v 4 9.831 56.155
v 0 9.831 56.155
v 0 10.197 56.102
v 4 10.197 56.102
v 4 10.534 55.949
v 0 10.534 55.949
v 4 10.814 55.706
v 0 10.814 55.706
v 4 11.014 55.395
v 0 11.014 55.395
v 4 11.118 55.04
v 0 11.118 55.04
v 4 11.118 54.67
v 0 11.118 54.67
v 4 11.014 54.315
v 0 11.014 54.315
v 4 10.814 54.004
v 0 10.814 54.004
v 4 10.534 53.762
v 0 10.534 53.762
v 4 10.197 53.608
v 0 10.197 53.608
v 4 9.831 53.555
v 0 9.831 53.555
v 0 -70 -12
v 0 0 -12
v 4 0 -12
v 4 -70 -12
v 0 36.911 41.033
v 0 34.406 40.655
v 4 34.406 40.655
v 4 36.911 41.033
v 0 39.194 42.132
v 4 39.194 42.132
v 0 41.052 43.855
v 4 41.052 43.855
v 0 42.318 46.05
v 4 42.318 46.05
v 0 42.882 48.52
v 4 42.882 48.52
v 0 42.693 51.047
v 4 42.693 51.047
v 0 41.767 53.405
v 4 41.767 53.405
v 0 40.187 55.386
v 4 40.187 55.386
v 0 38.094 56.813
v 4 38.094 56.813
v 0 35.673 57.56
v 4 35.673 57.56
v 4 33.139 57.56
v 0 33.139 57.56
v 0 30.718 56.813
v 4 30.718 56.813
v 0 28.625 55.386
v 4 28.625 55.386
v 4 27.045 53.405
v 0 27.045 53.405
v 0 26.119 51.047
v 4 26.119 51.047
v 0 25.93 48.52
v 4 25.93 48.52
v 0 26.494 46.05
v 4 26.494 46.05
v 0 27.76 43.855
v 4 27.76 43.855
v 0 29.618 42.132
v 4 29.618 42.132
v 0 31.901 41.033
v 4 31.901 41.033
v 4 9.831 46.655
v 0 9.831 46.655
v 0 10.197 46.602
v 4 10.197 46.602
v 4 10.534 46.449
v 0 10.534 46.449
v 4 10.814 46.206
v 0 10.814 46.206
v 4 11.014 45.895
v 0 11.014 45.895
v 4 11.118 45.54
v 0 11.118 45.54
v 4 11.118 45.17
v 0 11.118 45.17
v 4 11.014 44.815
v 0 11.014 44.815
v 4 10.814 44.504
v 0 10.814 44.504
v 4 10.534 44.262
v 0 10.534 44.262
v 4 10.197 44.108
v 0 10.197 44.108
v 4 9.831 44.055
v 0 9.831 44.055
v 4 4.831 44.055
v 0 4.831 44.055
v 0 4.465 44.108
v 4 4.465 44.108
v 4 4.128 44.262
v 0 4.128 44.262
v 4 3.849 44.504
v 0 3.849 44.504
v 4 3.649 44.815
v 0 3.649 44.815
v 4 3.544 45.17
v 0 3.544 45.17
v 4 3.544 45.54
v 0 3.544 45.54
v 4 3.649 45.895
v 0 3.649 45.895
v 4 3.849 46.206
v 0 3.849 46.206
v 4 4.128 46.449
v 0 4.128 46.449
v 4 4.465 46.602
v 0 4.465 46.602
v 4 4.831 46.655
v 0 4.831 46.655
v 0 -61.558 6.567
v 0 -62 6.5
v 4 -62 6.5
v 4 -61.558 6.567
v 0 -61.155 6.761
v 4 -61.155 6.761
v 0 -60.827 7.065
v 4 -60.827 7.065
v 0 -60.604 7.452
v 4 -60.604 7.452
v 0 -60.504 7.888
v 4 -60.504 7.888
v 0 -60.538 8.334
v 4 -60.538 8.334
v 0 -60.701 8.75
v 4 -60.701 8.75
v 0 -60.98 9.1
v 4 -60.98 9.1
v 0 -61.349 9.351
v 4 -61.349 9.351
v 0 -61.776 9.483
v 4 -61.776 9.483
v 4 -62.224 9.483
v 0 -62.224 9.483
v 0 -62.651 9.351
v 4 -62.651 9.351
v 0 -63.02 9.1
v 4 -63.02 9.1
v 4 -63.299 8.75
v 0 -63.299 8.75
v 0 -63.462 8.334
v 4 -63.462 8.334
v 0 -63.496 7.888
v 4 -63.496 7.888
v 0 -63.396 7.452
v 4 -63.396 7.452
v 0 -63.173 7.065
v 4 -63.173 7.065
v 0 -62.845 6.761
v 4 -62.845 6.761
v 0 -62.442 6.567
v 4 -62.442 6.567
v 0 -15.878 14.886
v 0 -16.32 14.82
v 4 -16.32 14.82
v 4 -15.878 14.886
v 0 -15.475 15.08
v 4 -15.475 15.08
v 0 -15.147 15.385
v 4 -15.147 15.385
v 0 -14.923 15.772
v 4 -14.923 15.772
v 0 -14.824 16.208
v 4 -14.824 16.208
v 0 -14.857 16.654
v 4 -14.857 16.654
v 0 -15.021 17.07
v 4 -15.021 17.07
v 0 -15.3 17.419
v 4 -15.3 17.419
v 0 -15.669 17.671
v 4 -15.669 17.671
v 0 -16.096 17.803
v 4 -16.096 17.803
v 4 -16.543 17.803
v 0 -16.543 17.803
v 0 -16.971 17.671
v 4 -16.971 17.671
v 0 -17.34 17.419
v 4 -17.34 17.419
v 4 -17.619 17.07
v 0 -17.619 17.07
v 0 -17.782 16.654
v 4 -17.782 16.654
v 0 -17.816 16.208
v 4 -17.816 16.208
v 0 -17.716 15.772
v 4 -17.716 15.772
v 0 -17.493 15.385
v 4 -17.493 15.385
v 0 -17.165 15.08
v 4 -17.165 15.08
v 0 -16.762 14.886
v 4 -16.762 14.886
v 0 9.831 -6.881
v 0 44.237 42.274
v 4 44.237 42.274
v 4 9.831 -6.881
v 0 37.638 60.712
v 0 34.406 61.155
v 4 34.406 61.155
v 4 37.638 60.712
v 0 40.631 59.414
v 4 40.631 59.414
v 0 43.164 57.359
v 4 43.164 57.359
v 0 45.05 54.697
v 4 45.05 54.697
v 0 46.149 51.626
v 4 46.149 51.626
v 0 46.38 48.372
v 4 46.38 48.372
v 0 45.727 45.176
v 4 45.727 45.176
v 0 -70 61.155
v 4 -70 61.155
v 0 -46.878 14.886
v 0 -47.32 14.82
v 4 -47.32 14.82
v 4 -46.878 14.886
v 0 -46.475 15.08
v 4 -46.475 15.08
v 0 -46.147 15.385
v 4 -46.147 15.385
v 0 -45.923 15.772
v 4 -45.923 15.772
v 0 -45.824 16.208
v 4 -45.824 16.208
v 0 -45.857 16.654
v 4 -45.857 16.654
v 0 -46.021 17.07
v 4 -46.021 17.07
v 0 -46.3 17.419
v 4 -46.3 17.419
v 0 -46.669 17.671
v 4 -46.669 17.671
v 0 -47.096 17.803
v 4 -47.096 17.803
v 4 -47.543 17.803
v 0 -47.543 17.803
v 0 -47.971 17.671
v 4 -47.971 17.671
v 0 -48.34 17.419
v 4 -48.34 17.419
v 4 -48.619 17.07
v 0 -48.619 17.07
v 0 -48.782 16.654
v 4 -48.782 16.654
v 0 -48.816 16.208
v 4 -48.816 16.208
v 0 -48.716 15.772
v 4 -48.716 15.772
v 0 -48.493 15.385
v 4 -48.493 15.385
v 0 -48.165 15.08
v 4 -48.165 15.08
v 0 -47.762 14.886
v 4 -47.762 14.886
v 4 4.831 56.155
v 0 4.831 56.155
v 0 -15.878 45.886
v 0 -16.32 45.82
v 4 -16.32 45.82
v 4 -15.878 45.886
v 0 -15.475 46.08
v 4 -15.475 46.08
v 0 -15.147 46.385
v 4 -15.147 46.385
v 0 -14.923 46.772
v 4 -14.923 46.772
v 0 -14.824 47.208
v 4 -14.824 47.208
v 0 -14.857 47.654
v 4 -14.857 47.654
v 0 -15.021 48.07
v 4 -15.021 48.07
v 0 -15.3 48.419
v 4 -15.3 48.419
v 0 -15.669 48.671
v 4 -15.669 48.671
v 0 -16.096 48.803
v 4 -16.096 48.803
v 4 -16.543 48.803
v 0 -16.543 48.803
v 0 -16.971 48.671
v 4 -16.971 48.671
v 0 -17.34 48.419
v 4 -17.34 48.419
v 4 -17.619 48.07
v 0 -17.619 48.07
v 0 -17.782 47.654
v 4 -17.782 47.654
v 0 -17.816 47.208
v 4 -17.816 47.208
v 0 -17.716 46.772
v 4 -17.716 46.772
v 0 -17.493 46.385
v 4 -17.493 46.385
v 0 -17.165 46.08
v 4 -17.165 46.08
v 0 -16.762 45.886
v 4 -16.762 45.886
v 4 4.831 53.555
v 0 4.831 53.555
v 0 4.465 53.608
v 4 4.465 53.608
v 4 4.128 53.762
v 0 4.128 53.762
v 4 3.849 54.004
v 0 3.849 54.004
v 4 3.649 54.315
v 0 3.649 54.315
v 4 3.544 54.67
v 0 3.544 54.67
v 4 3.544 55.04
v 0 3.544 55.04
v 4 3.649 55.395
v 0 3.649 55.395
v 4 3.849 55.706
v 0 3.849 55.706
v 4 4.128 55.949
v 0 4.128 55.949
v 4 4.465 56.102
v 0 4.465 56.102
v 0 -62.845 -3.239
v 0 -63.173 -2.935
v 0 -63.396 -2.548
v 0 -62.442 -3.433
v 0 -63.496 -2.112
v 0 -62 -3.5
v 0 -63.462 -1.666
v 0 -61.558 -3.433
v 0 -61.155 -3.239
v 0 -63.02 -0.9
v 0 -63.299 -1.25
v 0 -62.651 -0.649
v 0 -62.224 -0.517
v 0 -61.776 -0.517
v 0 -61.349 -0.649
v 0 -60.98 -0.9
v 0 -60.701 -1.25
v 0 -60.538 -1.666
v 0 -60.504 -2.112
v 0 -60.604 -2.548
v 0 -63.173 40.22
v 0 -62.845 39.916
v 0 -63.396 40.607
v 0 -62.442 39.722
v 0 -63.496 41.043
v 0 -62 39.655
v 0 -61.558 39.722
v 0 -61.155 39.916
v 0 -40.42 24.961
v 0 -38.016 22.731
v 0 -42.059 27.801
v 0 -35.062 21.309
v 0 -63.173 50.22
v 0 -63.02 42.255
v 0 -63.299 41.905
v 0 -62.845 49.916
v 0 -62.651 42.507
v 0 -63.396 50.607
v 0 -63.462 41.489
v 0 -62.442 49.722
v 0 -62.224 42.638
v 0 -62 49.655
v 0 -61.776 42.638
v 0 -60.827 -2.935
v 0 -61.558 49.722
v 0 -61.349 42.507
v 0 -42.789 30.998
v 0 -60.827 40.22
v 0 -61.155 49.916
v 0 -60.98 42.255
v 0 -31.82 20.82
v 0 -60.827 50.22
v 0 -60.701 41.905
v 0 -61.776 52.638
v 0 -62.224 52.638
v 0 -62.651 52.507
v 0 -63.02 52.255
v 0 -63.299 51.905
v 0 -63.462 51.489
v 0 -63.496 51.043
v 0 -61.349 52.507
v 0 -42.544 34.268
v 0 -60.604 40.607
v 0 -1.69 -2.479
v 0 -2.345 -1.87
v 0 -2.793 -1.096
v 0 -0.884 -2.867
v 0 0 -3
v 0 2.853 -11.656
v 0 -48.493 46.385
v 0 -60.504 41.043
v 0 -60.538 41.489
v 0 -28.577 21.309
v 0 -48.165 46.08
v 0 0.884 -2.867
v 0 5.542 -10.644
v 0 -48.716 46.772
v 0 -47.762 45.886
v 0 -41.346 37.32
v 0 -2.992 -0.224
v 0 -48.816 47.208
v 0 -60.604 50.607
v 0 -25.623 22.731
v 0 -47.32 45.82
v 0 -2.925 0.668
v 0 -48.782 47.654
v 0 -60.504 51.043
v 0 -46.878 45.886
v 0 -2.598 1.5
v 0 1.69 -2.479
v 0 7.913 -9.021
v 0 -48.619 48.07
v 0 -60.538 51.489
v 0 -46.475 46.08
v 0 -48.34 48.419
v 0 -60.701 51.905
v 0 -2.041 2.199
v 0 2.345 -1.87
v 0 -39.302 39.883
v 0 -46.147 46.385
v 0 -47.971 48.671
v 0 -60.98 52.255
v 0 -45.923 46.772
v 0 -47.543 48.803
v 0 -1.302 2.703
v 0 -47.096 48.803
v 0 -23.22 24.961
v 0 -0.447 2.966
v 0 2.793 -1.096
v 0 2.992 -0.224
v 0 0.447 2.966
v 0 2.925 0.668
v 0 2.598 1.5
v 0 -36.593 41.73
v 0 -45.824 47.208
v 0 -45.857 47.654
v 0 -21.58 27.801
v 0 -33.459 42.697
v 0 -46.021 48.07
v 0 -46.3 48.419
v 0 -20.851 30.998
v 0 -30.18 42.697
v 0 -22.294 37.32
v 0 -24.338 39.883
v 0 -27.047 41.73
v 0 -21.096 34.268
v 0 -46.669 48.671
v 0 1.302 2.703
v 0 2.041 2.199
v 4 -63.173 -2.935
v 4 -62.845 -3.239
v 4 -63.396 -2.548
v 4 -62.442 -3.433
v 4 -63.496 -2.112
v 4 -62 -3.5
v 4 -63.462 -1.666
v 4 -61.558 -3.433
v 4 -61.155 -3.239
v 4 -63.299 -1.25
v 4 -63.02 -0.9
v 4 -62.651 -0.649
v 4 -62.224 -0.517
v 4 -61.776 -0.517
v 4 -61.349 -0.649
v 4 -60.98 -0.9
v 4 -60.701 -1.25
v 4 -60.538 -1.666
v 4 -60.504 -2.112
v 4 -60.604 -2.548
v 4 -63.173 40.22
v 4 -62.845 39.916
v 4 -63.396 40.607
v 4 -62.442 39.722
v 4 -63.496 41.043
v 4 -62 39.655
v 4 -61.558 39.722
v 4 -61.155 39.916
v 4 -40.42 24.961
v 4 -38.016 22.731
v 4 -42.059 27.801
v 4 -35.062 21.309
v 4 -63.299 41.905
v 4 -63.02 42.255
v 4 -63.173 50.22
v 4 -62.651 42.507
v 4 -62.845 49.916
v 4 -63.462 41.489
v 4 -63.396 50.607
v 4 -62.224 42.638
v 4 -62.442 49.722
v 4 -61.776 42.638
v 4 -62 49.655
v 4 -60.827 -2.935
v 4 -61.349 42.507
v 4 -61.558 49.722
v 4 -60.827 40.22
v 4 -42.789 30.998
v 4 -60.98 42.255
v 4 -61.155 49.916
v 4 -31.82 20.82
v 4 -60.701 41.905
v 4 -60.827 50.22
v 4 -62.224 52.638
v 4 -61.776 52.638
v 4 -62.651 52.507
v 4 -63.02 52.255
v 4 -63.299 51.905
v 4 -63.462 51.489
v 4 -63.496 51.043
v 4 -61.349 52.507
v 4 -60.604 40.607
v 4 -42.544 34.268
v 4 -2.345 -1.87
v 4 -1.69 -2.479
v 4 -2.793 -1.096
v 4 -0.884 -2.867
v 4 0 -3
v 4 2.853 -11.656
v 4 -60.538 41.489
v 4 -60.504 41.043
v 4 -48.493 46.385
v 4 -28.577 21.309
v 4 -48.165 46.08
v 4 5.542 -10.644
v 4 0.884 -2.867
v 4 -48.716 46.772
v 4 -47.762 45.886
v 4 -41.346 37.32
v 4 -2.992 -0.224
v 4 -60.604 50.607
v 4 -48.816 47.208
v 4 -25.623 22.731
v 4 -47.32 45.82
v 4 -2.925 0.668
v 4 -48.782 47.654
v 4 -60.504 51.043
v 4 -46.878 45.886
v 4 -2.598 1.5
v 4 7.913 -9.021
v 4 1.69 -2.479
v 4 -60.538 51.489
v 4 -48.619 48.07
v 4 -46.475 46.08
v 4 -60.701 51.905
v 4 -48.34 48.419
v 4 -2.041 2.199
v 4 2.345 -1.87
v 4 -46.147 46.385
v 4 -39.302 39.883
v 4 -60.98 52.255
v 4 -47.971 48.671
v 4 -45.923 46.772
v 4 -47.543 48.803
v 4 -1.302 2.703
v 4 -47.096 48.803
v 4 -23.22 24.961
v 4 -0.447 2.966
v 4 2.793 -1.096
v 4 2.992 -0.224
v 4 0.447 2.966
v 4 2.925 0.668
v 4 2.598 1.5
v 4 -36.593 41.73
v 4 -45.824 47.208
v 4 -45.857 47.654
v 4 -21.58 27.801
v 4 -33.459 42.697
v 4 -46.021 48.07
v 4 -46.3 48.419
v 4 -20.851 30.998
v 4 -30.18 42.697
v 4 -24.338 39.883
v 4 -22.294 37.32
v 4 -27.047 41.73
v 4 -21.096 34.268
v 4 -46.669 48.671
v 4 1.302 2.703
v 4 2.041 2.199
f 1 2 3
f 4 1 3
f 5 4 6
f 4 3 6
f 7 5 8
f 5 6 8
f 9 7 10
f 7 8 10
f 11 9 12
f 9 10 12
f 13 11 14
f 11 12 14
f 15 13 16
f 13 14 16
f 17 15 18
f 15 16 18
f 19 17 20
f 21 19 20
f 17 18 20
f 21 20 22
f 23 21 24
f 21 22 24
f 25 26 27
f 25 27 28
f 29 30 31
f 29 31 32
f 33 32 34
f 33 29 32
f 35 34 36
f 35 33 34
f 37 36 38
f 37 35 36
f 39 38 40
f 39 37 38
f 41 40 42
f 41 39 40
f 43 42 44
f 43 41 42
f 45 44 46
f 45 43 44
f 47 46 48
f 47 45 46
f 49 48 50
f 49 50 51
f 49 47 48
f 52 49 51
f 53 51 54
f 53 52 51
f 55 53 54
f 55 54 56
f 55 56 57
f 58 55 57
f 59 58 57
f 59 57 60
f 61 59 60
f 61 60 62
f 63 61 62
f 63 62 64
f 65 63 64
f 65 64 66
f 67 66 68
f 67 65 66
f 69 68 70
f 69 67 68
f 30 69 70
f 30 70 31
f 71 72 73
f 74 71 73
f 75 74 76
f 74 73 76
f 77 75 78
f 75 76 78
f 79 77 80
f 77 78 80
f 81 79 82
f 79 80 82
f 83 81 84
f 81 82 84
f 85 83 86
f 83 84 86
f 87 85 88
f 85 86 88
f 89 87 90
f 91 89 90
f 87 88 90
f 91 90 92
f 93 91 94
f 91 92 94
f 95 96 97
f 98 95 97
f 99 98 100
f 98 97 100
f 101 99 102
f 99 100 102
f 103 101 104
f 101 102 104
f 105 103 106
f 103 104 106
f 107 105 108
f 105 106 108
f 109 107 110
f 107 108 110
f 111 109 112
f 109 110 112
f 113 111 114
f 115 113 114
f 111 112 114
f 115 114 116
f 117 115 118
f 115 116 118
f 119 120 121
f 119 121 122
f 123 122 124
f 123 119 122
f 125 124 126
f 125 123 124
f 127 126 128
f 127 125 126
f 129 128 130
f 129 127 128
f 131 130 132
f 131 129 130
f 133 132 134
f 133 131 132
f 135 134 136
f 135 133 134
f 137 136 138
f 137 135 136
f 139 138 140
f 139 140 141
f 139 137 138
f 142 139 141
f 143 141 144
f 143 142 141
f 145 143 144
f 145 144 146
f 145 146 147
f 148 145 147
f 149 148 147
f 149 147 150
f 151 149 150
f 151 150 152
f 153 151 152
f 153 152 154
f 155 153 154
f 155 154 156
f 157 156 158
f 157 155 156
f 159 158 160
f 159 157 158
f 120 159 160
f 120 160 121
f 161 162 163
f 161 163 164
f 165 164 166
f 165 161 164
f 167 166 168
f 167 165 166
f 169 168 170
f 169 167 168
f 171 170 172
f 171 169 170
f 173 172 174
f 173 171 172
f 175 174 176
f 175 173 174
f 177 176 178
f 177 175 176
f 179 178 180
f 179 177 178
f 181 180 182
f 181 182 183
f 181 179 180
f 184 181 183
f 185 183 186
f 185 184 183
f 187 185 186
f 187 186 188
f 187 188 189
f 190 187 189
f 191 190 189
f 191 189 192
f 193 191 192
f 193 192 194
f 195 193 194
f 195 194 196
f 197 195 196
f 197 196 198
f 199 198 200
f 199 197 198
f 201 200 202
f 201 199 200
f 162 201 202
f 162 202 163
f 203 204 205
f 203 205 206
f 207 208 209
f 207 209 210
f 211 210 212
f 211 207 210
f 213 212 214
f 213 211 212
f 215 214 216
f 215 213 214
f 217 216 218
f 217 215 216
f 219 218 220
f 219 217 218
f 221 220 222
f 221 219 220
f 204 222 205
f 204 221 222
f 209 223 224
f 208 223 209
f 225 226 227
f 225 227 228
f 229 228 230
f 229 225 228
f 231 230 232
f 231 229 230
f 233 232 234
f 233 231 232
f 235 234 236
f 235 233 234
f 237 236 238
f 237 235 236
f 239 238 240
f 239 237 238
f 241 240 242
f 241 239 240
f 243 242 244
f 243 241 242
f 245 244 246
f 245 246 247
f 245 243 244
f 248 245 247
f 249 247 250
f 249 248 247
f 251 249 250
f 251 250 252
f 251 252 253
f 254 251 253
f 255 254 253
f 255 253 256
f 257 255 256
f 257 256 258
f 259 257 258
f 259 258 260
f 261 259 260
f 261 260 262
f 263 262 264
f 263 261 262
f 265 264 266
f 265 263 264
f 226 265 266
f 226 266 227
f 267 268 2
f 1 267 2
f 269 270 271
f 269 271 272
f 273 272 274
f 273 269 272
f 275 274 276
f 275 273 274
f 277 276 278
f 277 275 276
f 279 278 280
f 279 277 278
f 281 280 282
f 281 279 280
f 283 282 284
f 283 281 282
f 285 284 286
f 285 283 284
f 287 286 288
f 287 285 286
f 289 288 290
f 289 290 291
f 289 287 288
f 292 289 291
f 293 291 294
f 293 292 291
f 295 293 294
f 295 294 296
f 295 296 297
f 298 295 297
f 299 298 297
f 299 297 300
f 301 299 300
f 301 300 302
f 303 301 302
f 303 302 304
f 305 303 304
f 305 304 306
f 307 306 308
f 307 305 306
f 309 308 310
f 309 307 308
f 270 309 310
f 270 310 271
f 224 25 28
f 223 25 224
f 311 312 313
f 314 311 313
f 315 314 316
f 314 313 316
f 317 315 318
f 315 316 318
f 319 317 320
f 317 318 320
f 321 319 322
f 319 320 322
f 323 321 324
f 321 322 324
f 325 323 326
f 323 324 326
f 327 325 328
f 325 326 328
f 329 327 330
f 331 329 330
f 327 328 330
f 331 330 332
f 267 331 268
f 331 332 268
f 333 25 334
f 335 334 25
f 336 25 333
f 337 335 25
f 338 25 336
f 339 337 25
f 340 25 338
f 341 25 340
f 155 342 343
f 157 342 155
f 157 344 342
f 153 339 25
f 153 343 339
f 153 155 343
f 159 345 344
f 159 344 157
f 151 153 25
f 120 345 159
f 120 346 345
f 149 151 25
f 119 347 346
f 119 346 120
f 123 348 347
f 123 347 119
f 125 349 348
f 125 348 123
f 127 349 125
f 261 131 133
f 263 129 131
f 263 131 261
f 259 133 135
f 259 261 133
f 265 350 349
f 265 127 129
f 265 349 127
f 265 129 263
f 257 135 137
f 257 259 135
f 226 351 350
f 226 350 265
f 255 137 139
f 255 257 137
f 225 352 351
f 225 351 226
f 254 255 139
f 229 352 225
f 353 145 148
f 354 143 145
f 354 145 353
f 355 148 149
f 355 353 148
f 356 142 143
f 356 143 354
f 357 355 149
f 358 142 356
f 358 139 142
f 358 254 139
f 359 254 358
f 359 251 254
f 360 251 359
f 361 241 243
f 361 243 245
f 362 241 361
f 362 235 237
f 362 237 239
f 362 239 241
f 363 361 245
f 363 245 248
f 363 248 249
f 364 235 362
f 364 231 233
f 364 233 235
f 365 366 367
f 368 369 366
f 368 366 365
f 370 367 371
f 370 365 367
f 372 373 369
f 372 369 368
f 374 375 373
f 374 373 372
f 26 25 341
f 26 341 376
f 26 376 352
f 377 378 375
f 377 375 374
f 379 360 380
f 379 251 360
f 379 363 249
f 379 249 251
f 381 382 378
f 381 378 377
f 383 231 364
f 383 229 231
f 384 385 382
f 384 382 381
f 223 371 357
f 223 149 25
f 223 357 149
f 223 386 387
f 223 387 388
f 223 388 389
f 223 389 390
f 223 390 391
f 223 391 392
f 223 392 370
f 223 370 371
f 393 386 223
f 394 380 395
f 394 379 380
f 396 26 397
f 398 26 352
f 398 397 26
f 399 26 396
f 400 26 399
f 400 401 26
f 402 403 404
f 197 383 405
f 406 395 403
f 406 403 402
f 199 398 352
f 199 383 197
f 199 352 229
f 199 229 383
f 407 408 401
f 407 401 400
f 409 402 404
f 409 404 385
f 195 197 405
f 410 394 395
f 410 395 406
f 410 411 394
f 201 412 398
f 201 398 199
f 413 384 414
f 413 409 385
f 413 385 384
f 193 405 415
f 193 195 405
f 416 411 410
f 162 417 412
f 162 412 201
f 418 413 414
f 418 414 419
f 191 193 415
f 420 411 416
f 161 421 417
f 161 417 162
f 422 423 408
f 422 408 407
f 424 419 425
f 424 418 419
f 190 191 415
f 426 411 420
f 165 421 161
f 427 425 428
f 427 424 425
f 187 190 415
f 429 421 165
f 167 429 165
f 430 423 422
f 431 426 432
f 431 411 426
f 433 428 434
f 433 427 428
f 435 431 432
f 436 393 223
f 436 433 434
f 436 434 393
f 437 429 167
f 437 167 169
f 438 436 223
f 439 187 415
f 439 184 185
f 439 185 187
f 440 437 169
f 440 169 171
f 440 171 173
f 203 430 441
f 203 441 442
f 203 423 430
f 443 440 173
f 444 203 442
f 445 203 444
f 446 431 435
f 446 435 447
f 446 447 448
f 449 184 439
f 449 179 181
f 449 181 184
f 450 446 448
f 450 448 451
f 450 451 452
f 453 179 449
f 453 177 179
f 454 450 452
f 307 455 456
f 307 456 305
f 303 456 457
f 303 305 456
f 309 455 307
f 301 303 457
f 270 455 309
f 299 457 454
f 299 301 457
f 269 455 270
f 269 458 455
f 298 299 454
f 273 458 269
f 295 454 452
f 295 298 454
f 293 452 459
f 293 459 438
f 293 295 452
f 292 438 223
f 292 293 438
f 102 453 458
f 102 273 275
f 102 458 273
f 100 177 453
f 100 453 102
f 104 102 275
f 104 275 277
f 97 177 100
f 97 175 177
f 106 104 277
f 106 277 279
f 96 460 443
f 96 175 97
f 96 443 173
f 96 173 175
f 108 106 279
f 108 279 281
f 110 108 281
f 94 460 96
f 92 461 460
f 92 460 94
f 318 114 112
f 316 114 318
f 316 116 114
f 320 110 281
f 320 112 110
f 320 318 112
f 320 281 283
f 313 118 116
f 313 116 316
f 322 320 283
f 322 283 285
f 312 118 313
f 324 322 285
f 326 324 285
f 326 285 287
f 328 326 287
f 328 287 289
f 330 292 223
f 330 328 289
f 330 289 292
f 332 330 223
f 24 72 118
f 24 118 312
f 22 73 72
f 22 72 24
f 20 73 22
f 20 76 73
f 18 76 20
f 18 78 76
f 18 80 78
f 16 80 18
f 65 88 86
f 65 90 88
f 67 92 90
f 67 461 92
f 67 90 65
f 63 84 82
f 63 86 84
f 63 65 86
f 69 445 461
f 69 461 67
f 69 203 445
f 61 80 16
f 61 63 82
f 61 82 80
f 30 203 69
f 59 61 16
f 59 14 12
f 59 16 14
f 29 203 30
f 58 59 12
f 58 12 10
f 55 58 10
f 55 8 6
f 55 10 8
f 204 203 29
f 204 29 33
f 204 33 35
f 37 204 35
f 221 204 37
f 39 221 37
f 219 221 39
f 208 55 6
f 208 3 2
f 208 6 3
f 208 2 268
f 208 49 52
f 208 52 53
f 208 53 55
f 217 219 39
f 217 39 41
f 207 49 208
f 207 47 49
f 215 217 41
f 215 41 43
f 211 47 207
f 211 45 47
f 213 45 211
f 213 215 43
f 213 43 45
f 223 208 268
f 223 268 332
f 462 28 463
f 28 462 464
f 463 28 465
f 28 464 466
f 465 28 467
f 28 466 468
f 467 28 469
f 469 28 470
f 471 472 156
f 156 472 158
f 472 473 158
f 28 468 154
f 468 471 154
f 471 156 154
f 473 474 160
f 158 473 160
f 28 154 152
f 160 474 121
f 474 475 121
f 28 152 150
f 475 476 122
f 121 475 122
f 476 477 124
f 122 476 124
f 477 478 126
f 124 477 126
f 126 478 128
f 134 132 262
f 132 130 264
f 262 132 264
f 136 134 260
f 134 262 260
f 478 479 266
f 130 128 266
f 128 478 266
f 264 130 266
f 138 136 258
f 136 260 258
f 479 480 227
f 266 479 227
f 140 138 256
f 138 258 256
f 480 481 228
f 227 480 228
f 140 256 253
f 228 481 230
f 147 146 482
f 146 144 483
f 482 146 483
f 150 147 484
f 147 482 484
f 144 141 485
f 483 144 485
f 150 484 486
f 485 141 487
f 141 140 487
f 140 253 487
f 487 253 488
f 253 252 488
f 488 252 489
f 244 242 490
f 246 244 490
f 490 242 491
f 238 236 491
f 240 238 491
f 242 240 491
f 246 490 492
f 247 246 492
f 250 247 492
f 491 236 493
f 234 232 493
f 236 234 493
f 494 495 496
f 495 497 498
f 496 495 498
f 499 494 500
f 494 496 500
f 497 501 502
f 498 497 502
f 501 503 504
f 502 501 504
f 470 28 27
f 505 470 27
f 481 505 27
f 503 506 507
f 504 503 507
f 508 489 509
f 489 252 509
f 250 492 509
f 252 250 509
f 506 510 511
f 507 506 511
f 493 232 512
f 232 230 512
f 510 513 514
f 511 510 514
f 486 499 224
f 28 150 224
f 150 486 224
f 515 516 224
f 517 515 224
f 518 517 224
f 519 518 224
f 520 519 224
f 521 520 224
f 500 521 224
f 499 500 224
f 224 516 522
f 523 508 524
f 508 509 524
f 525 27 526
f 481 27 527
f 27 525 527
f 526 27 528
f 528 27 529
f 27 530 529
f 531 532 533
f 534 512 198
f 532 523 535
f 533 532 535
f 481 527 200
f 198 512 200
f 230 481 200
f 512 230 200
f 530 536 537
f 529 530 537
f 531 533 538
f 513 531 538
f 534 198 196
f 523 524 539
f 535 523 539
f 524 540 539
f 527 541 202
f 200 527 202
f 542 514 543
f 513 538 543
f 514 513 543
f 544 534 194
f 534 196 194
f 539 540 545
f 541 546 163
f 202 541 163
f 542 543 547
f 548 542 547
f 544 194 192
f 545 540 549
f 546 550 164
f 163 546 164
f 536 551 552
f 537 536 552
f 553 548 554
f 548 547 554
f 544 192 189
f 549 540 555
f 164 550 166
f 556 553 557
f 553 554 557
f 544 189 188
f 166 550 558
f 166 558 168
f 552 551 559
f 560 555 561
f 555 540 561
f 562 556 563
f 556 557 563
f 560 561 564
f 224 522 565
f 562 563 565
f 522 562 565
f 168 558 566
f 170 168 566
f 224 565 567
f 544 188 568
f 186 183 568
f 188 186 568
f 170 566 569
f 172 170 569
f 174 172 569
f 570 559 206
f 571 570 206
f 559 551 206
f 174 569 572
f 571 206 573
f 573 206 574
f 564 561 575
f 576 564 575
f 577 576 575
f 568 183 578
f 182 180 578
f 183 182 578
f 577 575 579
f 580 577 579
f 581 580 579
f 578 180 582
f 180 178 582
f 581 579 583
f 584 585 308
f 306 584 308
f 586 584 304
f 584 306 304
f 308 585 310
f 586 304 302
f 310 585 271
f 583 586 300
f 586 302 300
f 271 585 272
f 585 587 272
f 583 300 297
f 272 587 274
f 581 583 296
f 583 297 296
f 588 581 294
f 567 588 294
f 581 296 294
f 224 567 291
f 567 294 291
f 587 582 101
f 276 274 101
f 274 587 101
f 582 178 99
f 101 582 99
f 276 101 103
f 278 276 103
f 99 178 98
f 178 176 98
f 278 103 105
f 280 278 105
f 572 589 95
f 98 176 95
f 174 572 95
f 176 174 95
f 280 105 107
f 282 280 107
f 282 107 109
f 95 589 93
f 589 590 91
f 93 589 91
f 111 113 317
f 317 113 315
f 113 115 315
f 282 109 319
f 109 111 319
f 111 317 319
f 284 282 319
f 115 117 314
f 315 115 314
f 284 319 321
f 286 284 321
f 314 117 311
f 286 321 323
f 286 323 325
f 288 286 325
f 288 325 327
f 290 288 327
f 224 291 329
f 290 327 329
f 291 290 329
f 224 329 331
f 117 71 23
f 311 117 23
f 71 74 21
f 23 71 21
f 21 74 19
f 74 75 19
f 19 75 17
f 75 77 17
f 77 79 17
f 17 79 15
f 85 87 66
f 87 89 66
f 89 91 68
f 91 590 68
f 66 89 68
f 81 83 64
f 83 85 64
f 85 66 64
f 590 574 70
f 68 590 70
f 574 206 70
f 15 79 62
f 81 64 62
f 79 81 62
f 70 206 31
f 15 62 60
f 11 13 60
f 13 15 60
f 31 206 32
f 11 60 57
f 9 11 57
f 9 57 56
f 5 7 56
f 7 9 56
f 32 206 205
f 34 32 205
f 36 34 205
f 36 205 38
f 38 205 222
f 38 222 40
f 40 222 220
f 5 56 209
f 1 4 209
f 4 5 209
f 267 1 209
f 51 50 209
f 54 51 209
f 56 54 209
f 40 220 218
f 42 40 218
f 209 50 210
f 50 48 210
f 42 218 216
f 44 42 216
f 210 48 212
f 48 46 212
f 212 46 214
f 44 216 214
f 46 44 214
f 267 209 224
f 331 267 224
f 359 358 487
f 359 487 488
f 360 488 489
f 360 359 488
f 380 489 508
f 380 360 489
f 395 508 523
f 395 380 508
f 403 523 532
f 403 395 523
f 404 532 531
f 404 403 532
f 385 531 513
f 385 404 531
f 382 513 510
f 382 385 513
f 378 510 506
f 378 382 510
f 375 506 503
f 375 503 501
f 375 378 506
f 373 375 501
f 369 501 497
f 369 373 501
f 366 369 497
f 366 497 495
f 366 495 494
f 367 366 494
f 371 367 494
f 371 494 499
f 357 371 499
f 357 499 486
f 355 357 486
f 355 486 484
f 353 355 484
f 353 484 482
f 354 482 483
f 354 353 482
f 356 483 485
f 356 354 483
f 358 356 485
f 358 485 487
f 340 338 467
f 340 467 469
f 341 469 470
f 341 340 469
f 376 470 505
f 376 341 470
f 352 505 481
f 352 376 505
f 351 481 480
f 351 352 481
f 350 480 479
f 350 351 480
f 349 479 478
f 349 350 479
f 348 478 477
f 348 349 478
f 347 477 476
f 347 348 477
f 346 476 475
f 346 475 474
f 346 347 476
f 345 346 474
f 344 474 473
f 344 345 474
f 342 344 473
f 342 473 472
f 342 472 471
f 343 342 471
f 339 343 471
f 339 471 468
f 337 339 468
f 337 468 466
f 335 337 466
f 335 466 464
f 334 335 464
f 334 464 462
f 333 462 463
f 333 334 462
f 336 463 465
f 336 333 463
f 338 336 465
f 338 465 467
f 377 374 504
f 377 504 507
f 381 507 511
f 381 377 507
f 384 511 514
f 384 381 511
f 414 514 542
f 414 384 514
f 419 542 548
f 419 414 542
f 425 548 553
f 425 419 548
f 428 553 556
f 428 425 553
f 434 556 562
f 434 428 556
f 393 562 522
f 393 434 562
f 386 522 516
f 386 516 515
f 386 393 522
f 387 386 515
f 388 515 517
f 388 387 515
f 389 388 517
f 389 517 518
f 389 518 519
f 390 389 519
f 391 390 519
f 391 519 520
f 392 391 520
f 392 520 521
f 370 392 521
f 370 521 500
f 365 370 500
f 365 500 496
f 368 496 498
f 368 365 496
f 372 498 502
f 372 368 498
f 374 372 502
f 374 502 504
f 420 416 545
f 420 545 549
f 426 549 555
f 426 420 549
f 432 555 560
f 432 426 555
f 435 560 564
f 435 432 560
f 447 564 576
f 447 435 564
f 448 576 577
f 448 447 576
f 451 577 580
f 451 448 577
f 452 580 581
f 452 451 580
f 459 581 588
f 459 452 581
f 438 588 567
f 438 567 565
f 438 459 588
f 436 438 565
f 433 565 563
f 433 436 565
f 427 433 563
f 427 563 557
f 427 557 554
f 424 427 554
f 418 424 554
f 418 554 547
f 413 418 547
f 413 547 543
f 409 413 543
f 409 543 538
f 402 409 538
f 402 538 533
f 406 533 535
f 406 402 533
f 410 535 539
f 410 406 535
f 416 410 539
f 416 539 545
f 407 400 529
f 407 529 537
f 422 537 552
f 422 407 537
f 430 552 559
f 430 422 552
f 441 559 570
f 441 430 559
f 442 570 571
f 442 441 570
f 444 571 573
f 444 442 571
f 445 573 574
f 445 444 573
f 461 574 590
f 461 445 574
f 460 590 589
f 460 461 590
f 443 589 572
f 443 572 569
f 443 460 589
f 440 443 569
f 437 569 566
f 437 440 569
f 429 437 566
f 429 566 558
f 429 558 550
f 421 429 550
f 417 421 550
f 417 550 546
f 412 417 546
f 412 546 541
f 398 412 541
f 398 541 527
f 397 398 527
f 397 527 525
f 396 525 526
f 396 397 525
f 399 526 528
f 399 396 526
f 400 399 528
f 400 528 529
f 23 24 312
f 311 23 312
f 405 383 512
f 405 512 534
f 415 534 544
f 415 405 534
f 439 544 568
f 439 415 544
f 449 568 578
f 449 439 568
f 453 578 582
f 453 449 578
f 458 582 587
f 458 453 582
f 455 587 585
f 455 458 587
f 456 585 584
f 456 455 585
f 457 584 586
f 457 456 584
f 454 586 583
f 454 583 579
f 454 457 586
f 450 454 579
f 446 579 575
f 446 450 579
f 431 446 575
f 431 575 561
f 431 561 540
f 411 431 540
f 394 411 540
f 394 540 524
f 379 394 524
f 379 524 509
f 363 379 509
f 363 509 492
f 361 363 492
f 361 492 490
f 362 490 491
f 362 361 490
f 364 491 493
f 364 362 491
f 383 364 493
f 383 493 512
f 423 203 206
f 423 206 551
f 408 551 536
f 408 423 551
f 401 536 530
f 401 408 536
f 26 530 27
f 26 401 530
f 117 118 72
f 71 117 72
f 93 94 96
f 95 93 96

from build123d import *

# Parameters (mm, degrees)
SKETCH_1_R      = 3
SKETCH_1_R_2    = 8.5
SKETCH_1_R_3    = 11
SKETCH_1_R_4    = 1.5
EXTRUDE_1_DEPTH = 4


with BuildPart() as part:
    # 草图1 → 凸台-拉伸1 (new body)
    with BuildSketch(Plane(origin=(0, 0, 0), x_dir=(0, 0, -1), z_dir=(1, 0, 0))):
        with BuildLine():
            Line((-42.273933648, 44.23702673), (6.8812, 9.83102673))
            ThreePointArc((6.8812, 9.83102673), (10.643645992, 5.541913027), (12, 0))
            Line((12, 0), (12, -70))
            Line((12, -70), (-61.155133648, -70))
            Line((-61.155133648, -70), (-61.155133648, 34.406))
            ThreePointArc((-61.155133648, 34.406), (-54.697046676, 45.049645992), (-42.273933648, 44.23702673))
        make_face()
        Circle(SKETCH_1_R, mode=Mode.SUBTRACT)
        with Locations((-49.155133648, 34.406)):
            Circle(SKETCH_1_R_2, mode=Mode.SUBTRACT)
        with Locations((-31.819805153, -31.819805153)):
            Circle(SKETCH_1_R_3, mode=Mode.SUBTRACT)
        with Locations((2, -62)):
            Circle(SKETCH_1_R_4, mode=Mode.SUBTRACT)
        with Locations((-8, -62)):
            Circle(SKETCH_1_R_4, mode=Mode.SUBTRACT)
        with Locations((-41.155133648, -62)):
            Circle(SKETCH_1_R_4, mode=Mode.SUBTRACT)
        with Locations((-51.155133648, -62)):
            Circle(SKETCH_1_R_4, mode=Mode.SUBTRACT)
        with Locations((-16.319805153, -16.319805153)):
            Circle(SKETCH_1_R_4, mode=Mode.SUBTRACT)
        with Locations((-16.319805153, -47.319805147)):
            Circle(SKETCH_1_R_4, mode=Mode.SUBTRACT)
        with Locations((-47.319805147, -47.319805147)):
            Circle(SKETCH_1_R_4, mode=Mode.SUBTRACT)
        with Locations((-47.319805147, -16.319805153)):
            Circle(SKETCH_1_R_4, mode=Mode.SUBTRACT)
        with BuildLine():
            Line((-53.555133648, 9.83102673), (-53.555133648, 4.83102673))
            ThreePointArc((-53.555133648, 4.83102673), (-54.855133648, 3.53102673), (-56.155133648, 4.83102673))
            Line((-56.155133648, 4.83102673), (-56.155133648, 9.83102673))
            ThreePointArc((-56.155133648, 9.83102673), (-54.855133648, 11.13102673), (-53.555133648, 9.83102673))
        make_face(mode=Mode.SUBTRACT)
        with BuildLine():
            Line((-44.055133648, 9.83102673), (-44.055133648, 4.83102673))
            ThreePointArc((-44.055133648, 4.83102673), (-45.355133648, 3.53102673), (-46.655133648, 4.83102673))
            Line((-46.655133648, 4.83102673), (-46.655133648, 9.83102673))
            ThreePointArc((-46.655133648, 9.83102673), (-45.355133648, 11.13102673), (-44.055133648, 9.83102673))
        make_face(mode=Mode.SUBTRACT)
    extrude(amount=EXTRUDE_1_DEPTH)


solid = part.part
